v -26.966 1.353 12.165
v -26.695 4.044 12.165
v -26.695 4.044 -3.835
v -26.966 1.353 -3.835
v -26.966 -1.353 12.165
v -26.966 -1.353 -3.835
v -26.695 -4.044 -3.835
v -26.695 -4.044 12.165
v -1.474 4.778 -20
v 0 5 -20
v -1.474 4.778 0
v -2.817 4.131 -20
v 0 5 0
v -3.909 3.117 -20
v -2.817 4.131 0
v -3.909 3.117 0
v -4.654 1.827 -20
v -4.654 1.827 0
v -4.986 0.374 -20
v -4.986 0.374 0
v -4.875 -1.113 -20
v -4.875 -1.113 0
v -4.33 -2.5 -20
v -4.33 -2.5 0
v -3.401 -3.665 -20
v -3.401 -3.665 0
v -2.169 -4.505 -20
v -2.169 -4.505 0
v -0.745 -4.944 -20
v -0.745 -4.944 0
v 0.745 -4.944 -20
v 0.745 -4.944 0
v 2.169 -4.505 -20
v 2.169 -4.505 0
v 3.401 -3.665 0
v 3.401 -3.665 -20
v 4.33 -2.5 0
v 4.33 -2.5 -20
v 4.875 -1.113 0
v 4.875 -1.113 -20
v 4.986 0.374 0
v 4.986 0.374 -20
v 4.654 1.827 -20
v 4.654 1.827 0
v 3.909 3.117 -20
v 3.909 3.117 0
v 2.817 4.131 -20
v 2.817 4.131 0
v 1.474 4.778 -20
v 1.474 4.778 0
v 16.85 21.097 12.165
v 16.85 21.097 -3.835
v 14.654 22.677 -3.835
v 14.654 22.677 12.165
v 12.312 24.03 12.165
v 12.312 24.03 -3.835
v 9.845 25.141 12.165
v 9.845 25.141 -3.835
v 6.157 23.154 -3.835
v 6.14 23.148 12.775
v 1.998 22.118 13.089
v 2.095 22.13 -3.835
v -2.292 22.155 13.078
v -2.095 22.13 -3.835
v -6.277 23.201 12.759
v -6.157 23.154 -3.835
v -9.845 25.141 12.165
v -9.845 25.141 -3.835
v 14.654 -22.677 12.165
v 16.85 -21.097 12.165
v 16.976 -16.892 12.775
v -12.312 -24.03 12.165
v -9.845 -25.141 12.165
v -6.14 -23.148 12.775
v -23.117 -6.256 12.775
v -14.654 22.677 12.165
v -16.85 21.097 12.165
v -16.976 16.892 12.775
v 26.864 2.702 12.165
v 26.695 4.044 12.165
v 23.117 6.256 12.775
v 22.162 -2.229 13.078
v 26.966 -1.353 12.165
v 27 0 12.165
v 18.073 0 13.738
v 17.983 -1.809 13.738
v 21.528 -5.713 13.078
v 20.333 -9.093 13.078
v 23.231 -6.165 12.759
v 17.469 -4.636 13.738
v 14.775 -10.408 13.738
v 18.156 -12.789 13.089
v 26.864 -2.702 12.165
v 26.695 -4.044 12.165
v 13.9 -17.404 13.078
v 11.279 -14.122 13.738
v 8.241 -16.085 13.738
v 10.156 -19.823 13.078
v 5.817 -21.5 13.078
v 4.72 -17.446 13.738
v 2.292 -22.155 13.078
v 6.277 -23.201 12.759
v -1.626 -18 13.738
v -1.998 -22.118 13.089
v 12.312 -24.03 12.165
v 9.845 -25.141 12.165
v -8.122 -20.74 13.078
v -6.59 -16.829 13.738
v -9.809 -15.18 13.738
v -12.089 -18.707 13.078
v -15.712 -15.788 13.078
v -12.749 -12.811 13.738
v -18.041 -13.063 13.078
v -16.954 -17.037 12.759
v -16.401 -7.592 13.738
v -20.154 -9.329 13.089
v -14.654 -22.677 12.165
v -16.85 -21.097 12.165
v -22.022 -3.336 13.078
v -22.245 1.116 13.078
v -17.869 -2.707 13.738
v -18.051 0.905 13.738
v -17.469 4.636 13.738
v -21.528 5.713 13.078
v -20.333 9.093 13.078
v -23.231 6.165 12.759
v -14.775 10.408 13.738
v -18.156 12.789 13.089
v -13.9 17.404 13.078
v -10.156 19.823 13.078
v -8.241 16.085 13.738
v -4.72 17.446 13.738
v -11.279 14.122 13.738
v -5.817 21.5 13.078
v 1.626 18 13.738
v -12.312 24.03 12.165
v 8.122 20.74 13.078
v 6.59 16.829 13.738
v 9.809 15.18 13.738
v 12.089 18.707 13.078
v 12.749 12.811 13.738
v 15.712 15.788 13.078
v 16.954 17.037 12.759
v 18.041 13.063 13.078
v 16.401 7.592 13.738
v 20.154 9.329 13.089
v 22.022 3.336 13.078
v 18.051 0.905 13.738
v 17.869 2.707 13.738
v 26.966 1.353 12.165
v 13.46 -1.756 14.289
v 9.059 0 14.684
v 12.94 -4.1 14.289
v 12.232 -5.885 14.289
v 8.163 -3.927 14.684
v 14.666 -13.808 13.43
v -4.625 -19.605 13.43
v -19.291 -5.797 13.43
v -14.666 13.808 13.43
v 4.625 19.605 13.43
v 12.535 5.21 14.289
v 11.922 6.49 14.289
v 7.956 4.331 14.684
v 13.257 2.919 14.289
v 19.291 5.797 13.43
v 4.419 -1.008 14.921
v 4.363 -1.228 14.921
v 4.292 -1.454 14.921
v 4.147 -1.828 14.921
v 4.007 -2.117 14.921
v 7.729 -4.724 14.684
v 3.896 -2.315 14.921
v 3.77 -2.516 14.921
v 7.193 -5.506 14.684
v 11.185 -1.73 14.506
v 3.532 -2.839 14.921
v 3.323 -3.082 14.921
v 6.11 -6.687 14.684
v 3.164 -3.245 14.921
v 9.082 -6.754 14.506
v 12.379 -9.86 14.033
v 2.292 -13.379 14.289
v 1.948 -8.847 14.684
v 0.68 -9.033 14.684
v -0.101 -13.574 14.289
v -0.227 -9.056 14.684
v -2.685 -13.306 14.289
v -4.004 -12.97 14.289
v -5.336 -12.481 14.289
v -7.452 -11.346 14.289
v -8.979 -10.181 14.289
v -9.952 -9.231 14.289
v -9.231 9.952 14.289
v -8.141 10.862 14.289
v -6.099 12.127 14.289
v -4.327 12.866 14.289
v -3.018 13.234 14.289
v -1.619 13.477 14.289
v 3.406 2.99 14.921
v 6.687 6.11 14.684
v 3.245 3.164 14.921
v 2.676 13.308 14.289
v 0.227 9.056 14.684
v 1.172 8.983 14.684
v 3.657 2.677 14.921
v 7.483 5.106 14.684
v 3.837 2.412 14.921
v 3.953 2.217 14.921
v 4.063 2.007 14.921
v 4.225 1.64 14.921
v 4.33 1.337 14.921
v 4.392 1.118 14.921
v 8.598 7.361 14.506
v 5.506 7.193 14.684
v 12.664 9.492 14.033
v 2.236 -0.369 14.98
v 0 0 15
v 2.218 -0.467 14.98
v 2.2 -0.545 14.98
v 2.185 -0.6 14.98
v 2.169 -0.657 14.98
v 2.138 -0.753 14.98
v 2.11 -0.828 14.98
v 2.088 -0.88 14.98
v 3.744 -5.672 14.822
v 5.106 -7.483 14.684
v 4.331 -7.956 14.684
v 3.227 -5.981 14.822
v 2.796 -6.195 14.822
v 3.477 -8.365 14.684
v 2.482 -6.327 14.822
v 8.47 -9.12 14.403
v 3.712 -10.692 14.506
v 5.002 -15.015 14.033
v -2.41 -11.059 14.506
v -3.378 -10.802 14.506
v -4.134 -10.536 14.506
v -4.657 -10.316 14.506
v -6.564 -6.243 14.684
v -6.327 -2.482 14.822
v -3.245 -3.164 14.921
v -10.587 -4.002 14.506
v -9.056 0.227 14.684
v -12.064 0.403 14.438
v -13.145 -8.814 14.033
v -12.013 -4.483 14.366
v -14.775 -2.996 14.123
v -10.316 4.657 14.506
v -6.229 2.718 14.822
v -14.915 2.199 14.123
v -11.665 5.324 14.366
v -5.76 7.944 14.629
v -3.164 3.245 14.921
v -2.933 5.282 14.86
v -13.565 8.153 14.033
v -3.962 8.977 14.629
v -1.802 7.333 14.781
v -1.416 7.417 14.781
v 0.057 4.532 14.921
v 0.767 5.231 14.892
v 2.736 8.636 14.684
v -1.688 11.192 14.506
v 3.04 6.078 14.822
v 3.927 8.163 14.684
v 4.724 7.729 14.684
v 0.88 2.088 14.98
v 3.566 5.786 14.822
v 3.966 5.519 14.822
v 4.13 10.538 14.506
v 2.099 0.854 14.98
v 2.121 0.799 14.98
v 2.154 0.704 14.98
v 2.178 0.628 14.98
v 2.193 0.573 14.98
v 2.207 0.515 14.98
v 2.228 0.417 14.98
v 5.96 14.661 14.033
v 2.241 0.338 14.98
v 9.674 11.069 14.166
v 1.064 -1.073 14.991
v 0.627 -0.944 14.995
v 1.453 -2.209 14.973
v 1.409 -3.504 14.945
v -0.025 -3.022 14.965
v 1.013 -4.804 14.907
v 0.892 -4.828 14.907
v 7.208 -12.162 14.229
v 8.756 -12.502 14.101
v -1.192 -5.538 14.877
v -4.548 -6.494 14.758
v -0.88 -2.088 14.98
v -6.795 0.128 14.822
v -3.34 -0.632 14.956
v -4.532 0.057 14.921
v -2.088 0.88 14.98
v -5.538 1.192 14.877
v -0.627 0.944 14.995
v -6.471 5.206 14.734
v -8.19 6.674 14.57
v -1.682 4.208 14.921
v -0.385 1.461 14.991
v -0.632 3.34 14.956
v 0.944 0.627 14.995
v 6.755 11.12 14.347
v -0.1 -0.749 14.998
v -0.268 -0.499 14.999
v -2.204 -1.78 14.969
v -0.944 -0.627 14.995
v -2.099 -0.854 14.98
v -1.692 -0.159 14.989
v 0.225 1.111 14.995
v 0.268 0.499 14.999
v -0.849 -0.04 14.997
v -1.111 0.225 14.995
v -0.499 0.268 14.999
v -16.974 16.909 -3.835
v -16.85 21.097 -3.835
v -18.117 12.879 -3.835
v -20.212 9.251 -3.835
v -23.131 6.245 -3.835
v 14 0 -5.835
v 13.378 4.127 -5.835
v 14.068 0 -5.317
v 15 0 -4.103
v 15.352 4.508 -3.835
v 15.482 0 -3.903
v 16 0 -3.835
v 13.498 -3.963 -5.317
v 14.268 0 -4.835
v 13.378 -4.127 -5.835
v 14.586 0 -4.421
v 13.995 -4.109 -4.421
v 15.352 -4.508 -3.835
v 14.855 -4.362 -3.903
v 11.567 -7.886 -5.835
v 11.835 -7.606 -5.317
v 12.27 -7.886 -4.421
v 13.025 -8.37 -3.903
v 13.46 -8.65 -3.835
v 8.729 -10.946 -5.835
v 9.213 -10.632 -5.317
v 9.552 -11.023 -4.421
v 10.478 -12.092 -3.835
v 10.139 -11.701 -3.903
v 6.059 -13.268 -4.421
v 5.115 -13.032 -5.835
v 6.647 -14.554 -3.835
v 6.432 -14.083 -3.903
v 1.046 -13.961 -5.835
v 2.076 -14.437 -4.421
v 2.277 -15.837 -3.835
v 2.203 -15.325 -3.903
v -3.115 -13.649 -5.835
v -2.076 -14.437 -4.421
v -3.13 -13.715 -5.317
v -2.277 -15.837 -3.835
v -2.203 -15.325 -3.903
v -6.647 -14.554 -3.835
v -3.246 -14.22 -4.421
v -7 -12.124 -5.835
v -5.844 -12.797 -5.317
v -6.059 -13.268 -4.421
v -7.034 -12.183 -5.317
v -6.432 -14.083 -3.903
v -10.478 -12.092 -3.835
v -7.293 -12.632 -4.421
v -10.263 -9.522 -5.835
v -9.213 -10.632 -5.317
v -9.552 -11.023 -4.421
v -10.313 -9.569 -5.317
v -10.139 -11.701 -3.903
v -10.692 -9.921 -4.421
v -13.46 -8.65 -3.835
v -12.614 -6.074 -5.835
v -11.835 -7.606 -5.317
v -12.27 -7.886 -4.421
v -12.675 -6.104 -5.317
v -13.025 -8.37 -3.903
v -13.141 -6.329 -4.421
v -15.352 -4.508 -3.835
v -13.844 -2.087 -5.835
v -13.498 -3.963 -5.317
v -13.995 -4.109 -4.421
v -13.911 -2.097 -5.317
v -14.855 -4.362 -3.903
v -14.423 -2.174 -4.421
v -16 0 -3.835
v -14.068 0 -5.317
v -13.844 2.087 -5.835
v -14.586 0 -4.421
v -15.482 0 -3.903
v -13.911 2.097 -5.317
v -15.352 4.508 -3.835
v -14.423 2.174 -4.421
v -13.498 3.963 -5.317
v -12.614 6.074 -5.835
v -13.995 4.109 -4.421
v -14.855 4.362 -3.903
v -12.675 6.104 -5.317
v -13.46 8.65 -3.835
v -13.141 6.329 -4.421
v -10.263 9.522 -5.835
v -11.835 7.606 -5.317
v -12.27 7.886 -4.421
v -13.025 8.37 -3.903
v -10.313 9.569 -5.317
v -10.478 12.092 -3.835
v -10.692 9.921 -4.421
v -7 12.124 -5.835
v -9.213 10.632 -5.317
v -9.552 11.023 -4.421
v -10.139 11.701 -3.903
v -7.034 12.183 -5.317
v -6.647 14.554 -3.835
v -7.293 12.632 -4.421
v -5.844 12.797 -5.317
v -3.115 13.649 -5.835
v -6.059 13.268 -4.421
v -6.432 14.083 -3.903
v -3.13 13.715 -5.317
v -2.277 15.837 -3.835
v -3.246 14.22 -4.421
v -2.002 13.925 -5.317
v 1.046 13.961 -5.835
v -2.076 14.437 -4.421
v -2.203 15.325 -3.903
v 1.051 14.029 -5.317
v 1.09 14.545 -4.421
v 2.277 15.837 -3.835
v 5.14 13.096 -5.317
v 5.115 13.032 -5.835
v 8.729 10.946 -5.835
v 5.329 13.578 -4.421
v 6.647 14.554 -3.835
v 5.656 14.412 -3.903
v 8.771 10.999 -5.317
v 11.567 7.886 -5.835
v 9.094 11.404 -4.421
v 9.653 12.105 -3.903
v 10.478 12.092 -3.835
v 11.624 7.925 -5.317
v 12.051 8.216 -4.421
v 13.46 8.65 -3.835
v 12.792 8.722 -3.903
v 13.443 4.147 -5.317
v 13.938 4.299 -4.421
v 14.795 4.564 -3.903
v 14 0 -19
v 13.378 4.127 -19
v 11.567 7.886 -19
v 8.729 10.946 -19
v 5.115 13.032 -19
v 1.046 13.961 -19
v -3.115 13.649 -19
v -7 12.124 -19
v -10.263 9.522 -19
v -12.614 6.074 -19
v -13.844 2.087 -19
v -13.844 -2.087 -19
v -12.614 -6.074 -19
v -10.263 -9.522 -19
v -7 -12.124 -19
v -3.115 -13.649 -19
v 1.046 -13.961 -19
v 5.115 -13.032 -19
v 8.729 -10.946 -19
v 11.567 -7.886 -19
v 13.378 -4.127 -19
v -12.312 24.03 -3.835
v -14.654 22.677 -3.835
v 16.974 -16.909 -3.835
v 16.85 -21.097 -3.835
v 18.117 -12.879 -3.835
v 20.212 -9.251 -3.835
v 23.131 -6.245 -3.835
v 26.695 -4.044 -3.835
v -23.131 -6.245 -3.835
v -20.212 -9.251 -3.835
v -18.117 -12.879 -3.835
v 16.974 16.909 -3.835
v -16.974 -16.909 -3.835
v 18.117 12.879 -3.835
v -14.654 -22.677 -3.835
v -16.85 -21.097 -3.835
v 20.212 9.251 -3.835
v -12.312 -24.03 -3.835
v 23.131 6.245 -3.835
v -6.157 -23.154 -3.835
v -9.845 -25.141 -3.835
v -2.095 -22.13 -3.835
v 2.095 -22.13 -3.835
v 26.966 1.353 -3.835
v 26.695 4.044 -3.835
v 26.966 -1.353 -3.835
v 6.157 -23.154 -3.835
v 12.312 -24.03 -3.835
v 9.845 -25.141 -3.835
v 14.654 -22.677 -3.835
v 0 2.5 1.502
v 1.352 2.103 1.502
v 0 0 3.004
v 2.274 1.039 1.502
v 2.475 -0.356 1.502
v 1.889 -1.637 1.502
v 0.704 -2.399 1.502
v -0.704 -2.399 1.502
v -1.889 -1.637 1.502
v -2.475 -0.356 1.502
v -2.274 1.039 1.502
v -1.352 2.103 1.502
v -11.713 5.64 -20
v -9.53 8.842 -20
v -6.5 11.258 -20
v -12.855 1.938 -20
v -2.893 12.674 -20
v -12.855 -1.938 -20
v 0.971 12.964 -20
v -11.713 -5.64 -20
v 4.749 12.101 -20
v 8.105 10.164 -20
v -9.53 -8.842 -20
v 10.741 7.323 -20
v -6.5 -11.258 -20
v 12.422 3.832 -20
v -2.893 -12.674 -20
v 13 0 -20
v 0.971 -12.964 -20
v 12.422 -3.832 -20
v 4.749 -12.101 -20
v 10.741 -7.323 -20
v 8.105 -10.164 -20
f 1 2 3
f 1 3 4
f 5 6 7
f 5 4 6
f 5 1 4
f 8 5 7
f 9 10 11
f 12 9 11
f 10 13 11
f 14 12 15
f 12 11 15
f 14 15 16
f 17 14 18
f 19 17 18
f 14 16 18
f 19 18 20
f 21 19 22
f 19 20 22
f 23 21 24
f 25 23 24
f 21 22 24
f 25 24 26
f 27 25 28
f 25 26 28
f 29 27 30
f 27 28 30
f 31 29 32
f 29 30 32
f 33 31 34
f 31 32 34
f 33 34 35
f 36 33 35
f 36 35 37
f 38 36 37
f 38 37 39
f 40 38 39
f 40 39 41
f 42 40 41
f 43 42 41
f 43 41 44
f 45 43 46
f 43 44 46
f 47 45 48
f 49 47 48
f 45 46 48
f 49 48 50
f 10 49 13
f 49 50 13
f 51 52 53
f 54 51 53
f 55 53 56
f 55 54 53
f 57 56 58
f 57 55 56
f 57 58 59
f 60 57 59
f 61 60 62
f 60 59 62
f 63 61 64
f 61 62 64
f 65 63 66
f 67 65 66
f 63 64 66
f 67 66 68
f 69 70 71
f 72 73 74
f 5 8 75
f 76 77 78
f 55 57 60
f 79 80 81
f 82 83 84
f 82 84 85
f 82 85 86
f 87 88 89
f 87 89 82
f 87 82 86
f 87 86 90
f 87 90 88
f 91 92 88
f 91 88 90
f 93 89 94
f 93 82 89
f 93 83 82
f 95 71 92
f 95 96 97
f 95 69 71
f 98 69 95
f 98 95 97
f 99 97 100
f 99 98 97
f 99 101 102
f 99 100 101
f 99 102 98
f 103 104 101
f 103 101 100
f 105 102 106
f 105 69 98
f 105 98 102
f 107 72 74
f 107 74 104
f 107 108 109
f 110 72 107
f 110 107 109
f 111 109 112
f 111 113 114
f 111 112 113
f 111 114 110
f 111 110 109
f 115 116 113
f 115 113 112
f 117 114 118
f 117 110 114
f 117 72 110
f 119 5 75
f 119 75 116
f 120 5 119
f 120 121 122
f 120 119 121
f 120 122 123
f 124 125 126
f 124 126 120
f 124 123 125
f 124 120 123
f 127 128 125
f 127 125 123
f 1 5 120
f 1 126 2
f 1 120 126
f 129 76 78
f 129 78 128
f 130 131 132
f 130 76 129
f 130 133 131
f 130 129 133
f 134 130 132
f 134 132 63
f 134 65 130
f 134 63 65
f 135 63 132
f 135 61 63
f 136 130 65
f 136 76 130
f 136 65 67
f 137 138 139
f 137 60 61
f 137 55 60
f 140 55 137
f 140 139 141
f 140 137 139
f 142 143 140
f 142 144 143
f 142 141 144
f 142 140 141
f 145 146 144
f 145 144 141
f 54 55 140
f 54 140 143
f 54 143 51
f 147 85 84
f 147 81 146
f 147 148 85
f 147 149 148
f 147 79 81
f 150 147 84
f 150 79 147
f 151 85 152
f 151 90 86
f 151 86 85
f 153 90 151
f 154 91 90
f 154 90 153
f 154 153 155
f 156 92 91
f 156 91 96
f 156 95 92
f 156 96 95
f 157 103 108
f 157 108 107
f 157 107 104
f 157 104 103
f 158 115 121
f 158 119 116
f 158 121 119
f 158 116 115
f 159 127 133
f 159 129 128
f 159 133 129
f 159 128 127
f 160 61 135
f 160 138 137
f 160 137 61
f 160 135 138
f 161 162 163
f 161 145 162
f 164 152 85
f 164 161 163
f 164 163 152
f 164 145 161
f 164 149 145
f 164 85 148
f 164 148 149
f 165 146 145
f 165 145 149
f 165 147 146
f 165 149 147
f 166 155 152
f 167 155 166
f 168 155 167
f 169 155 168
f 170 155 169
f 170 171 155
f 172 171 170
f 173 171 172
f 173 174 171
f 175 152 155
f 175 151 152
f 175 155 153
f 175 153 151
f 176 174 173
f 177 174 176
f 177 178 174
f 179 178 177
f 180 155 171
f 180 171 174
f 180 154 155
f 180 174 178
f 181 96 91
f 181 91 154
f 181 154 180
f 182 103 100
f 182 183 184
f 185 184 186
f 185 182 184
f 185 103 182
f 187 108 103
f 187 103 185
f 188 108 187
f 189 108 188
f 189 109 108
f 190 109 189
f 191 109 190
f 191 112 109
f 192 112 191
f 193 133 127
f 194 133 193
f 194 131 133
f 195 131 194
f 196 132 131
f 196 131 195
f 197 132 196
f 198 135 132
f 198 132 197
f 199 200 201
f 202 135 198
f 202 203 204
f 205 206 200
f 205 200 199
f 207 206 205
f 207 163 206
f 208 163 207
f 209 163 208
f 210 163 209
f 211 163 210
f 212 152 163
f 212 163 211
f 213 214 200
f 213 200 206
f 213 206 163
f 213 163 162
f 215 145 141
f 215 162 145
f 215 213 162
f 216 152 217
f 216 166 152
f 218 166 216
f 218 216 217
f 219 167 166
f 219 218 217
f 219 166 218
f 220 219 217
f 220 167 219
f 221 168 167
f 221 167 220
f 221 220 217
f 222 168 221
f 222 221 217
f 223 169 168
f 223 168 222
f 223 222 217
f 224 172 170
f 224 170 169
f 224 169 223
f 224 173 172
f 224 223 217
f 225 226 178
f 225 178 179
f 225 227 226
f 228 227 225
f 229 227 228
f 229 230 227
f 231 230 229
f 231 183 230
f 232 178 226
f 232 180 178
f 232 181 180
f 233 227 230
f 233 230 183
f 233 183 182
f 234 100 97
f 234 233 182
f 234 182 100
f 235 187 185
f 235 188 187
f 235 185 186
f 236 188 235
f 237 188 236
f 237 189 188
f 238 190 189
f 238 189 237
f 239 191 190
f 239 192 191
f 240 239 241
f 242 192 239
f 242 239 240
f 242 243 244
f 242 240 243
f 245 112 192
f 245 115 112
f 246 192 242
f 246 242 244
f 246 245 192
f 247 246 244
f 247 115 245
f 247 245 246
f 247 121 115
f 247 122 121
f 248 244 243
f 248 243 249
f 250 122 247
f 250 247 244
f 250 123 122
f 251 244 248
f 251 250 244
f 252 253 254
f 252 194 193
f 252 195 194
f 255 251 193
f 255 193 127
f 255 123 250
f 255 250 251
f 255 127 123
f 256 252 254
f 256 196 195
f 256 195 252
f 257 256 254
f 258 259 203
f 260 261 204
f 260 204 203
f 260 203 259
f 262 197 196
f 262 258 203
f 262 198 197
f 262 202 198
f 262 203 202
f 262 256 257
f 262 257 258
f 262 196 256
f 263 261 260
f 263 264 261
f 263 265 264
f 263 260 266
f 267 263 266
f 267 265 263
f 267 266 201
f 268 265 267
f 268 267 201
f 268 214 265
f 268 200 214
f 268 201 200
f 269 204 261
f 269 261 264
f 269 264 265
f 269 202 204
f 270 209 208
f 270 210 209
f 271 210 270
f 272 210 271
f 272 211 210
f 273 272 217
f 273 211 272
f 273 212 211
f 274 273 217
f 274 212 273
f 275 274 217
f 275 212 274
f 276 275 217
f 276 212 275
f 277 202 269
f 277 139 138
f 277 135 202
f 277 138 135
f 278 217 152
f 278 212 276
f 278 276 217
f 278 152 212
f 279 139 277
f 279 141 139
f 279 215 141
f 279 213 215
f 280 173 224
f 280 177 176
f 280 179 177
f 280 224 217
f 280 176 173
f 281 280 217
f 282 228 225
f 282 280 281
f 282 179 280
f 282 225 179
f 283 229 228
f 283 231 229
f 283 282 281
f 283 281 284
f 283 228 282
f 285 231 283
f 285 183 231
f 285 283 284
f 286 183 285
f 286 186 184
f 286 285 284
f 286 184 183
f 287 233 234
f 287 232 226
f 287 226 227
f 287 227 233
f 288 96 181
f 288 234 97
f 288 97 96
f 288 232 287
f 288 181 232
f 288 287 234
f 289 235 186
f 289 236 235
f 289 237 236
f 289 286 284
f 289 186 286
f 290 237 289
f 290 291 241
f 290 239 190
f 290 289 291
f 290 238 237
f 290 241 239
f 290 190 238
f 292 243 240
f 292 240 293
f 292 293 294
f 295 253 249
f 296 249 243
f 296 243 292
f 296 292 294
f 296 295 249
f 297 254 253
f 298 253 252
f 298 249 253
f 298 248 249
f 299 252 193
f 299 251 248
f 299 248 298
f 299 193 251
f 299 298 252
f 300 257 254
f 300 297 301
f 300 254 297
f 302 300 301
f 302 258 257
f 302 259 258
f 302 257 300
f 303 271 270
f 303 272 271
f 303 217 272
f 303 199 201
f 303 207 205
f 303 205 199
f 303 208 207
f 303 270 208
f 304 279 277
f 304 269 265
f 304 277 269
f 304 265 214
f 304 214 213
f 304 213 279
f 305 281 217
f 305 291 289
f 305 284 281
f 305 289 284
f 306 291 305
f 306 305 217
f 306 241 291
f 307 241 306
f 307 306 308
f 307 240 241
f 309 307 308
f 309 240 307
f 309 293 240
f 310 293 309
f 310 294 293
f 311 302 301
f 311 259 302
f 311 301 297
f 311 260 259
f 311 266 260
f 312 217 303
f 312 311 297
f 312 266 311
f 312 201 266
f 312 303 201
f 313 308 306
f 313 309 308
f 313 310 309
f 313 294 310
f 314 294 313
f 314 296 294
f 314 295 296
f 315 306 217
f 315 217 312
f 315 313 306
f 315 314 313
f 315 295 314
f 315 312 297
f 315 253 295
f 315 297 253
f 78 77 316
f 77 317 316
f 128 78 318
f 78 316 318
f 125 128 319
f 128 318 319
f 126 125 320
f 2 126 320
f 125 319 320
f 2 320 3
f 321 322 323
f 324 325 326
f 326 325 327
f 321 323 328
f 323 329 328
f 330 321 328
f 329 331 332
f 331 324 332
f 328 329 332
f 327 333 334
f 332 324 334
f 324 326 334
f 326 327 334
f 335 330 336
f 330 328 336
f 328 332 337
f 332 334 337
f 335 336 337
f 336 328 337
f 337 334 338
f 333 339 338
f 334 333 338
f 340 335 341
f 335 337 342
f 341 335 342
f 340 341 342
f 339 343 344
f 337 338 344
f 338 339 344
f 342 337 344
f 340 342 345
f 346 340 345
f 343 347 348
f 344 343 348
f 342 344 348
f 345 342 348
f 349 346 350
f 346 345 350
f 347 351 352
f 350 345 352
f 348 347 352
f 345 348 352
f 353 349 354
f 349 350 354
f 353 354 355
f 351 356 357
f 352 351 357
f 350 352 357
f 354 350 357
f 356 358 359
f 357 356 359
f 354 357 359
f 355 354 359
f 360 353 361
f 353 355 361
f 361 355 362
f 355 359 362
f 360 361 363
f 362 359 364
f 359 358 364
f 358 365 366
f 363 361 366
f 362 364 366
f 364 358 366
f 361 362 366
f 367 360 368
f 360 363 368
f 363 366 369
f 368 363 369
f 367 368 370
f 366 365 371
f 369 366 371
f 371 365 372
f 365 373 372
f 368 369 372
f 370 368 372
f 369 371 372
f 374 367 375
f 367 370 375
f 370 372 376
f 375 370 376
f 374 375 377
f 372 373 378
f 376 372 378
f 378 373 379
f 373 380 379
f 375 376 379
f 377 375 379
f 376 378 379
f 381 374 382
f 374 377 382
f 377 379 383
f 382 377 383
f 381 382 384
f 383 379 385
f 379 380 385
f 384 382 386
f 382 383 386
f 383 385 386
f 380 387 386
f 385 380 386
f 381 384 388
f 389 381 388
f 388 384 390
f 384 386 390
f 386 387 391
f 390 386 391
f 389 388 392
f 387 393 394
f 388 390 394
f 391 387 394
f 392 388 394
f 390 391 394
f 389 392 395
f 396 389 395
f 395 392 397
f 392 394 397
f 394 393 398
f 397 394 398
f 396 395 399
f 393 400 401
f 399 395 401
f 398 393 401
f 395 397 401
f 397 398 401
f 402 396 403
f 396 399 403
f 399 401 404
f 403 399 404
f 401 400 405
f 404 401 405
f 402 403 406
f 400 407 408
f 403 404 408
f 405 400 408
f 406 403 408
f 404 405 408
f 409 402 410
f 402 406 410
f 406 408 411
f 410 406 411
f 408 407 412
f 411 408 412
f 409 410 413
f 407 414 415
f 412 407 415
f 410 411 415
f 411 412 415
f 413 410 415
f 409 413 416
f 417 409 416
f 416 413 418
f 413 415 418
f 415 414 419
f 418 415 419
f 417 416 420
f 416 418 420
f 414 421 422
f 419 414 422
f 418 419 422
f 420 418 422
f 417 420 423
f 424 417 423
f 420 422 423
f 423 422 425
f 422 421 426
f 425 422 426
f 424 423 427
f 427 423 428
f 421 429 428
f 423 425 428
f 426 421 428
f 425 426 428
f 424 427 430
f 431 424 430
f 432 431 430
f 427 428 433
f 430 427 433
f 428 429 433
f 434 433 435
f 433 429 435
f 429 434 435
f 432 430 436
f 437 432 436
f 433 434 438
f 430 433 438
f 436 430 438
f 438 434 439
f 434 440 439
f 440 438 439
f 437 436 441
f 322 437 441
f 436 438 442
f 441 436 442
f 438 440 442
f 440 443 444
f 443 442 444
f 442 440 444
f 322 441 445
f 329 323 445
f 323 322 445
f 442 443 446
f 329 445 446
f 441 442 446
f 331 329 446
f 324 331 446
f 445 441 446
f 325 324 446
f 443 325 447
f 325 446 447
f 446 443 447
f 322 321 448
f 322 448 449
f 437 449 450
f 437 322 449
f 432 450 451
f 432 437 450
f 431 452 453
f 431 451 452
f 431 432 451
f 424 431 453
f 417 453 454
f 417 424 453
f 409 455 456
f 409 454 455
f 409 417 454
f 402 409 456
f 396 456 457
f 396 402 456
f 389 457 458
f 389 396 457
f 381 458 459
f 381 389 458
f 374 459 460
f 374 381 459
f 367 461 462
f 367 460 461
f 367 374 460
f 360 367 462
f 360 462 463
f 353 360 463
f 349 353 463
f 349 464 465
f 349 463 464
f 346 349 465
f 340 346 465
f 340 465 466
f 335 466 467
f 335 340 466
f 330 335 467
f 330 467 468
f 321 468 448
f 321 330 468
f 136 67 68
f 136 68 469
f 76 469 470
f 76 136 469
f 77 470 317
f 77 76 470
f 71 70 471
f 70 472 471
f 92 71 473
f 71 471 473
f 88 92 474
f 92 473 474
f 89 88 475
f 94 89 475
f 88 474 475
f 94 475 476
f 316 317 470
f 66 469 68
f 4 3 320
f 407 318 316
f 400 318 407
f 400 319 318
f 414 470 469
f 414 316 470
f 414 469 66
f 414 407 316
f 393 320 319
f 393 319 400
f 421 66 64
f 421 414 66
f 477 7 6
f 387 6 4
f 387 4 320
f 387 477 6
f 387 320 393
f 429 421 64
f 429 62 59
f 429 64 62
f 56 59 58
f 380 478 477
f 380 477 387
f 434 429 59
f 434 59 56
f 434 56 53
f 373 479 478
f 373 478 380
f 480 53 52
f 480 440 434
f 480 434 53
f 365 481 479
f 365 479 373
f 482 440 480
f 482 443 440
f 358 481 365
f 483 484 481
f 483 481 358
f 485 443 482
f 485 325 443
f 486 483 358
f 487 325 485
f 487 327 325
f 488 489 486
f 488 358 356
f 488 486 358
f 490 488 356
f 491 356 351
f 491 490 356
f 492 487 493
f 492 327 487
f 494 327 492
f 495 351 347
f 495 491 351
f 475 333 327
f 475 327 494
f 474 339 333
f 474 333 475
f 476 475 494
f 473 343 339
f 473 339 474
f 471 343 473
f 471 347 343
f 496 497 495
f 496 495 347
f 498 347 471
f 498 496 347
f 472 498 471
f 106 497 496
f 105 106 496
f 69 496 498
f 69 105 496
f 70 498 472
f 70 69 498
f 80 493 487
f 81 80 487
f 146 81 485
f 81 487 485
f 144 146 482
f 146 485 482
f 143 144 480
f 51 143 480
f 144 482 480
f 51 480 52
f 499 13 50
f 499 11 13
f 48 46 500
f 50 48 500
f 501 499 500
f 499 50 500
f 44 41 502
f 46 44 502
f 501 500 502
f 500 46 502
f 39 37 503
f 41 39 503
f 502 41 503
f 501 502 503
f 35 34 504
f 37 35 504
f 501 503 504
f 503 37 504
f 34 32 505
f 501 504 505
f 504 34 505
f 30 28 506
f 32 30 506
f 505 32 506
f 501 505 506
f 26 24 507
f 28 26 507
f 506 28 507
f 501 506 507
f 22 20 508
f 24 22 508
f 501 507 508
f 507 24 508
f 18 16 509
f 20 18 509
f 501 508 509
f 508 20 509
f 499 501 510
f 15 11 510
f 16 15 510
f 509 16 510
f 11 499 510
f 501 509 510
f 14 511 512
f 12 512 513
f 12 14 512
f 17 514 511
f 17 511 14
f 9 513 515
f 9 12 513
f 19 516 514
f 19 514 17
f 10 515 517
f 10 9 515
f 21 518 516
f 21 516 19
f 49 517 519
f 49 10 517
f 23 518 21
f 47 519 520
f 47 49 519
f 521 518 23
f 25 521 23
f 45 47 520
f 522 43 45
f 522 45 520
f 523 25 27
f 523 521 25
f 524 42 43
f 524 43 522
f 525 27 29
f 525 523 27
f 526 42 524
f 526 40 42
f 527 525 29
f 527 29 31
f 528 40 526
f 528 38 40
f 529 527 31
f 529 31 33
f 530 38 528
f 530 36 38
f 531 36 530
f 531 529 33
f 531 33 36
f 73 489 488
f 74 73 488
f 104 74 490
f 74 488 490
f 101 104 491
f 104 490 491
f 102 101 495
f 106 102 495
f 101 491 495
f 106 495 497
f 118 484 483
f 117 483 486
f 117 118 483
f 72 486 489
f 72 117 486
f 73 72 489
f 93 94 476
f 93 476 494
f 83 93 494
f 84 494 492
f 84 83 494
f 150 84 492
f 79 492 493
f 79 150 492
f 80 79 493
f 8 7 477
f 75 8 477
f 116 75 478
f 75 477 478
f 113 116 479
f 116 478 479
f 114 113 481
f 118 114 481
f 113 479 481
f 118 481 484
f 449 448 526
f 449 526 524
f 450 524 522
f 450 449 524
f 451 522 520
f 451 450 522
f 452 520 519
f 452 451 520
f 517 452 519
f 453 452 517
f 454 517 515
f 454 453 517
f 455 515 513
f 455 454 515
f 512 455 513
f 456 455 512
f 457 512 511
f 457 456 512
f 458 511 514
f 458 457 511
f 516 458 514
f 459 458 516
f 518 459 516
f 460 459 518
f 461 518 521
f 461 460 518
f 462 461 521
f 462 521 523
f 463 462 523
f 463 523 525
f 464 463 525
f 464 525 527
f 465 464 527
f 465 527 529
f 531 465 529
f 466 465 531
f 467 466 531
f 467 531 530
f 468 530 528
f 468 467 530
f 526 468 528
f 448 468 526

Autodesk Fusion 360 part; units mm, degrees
sketch "草图1" plane through (0, 0, 0) normal (0, 1, 0) x (1, 0, 0)
  line L0 (0, -75) -> (0, 75) construction
  line L1 (0, 20) -> (13, 20)
  line L2 (14, 19) -> (14, 5.8348)
  line L3 (16, 3.8348) -> (27, 3.8348)
  line L4 (27, 3.8348) -> (27, -12.1652)
  line L5 (0, 20) -> (0, -15)
  arc A0 (0, -15) -> (27, -12.1652) centre (0, 115) ccw
  arc A1 (14, 5.8348) -> (16, 3.8348) centre (16, 5.8348) ccw
  line L6 (13, 20) -> (14, 19)
  point P0 (14, 20)
  dimension "d1" = 20
  dimension "d2" = 14
  dimension "d3" = 16
  dimension "d4" = 35
  dimension "d5" = 130
  dimension "d6" = 27
  dimension "d7" = 2
  dimension "d8" = 1
  dimension "d9" = 45
revolve "旋转1" add sketch "草图1" angle 360 about axis through (0, 0, 75) along (0, 0, -1)
sketch "草图2" plane through (0, 0, 0) normal (0, 0, 1) x (1, 0, 0)
  circle A0 centre (0, 0) radius 27
  circle A1 centre (0, 0) radius 22 construction
  arc A2 (-9.8452, 25.141) -> (9.8452, 25.141) centre (0, 39) ccw
  line L0 (0, 40) -> (0, -45) construction
  arc A3 (-26.6954, 4.0443) -> (-16.8501, 21.0967) centre (-33.775, 19.5) ccw
  arc A4 (-16.8501, -21.0967) -> (-26.6954, -4.0443) centre (-33.775, -19.5) ccw
  arc A5 (9.8452, -25.141) -> (-9.8452, -25.141) centre (0, -39) ccw
  arc A6 (26.6954, -4.0443) -> (16.8501, -21.0967) centre (33.775, -19.5) ccw
  arc A7 (16.8501, 21.0967) -> (26.6954, 4.0443) centre (33.775, 19.5) ccw
  dimension "d11" = 54
  dimension "d12" = 44
  dimension "d13" = 17
  dimension "d15" = 360
extrude "拉伸1" cut sketch "草图2" along normal through all and the other way through all contours A0 A2 A3 A4 A5 A6 A7 keep common part
hole "孔1" at (0, 0, -20) direction (0, 0, 1) diameter 10 depth 20 tip angle 118
